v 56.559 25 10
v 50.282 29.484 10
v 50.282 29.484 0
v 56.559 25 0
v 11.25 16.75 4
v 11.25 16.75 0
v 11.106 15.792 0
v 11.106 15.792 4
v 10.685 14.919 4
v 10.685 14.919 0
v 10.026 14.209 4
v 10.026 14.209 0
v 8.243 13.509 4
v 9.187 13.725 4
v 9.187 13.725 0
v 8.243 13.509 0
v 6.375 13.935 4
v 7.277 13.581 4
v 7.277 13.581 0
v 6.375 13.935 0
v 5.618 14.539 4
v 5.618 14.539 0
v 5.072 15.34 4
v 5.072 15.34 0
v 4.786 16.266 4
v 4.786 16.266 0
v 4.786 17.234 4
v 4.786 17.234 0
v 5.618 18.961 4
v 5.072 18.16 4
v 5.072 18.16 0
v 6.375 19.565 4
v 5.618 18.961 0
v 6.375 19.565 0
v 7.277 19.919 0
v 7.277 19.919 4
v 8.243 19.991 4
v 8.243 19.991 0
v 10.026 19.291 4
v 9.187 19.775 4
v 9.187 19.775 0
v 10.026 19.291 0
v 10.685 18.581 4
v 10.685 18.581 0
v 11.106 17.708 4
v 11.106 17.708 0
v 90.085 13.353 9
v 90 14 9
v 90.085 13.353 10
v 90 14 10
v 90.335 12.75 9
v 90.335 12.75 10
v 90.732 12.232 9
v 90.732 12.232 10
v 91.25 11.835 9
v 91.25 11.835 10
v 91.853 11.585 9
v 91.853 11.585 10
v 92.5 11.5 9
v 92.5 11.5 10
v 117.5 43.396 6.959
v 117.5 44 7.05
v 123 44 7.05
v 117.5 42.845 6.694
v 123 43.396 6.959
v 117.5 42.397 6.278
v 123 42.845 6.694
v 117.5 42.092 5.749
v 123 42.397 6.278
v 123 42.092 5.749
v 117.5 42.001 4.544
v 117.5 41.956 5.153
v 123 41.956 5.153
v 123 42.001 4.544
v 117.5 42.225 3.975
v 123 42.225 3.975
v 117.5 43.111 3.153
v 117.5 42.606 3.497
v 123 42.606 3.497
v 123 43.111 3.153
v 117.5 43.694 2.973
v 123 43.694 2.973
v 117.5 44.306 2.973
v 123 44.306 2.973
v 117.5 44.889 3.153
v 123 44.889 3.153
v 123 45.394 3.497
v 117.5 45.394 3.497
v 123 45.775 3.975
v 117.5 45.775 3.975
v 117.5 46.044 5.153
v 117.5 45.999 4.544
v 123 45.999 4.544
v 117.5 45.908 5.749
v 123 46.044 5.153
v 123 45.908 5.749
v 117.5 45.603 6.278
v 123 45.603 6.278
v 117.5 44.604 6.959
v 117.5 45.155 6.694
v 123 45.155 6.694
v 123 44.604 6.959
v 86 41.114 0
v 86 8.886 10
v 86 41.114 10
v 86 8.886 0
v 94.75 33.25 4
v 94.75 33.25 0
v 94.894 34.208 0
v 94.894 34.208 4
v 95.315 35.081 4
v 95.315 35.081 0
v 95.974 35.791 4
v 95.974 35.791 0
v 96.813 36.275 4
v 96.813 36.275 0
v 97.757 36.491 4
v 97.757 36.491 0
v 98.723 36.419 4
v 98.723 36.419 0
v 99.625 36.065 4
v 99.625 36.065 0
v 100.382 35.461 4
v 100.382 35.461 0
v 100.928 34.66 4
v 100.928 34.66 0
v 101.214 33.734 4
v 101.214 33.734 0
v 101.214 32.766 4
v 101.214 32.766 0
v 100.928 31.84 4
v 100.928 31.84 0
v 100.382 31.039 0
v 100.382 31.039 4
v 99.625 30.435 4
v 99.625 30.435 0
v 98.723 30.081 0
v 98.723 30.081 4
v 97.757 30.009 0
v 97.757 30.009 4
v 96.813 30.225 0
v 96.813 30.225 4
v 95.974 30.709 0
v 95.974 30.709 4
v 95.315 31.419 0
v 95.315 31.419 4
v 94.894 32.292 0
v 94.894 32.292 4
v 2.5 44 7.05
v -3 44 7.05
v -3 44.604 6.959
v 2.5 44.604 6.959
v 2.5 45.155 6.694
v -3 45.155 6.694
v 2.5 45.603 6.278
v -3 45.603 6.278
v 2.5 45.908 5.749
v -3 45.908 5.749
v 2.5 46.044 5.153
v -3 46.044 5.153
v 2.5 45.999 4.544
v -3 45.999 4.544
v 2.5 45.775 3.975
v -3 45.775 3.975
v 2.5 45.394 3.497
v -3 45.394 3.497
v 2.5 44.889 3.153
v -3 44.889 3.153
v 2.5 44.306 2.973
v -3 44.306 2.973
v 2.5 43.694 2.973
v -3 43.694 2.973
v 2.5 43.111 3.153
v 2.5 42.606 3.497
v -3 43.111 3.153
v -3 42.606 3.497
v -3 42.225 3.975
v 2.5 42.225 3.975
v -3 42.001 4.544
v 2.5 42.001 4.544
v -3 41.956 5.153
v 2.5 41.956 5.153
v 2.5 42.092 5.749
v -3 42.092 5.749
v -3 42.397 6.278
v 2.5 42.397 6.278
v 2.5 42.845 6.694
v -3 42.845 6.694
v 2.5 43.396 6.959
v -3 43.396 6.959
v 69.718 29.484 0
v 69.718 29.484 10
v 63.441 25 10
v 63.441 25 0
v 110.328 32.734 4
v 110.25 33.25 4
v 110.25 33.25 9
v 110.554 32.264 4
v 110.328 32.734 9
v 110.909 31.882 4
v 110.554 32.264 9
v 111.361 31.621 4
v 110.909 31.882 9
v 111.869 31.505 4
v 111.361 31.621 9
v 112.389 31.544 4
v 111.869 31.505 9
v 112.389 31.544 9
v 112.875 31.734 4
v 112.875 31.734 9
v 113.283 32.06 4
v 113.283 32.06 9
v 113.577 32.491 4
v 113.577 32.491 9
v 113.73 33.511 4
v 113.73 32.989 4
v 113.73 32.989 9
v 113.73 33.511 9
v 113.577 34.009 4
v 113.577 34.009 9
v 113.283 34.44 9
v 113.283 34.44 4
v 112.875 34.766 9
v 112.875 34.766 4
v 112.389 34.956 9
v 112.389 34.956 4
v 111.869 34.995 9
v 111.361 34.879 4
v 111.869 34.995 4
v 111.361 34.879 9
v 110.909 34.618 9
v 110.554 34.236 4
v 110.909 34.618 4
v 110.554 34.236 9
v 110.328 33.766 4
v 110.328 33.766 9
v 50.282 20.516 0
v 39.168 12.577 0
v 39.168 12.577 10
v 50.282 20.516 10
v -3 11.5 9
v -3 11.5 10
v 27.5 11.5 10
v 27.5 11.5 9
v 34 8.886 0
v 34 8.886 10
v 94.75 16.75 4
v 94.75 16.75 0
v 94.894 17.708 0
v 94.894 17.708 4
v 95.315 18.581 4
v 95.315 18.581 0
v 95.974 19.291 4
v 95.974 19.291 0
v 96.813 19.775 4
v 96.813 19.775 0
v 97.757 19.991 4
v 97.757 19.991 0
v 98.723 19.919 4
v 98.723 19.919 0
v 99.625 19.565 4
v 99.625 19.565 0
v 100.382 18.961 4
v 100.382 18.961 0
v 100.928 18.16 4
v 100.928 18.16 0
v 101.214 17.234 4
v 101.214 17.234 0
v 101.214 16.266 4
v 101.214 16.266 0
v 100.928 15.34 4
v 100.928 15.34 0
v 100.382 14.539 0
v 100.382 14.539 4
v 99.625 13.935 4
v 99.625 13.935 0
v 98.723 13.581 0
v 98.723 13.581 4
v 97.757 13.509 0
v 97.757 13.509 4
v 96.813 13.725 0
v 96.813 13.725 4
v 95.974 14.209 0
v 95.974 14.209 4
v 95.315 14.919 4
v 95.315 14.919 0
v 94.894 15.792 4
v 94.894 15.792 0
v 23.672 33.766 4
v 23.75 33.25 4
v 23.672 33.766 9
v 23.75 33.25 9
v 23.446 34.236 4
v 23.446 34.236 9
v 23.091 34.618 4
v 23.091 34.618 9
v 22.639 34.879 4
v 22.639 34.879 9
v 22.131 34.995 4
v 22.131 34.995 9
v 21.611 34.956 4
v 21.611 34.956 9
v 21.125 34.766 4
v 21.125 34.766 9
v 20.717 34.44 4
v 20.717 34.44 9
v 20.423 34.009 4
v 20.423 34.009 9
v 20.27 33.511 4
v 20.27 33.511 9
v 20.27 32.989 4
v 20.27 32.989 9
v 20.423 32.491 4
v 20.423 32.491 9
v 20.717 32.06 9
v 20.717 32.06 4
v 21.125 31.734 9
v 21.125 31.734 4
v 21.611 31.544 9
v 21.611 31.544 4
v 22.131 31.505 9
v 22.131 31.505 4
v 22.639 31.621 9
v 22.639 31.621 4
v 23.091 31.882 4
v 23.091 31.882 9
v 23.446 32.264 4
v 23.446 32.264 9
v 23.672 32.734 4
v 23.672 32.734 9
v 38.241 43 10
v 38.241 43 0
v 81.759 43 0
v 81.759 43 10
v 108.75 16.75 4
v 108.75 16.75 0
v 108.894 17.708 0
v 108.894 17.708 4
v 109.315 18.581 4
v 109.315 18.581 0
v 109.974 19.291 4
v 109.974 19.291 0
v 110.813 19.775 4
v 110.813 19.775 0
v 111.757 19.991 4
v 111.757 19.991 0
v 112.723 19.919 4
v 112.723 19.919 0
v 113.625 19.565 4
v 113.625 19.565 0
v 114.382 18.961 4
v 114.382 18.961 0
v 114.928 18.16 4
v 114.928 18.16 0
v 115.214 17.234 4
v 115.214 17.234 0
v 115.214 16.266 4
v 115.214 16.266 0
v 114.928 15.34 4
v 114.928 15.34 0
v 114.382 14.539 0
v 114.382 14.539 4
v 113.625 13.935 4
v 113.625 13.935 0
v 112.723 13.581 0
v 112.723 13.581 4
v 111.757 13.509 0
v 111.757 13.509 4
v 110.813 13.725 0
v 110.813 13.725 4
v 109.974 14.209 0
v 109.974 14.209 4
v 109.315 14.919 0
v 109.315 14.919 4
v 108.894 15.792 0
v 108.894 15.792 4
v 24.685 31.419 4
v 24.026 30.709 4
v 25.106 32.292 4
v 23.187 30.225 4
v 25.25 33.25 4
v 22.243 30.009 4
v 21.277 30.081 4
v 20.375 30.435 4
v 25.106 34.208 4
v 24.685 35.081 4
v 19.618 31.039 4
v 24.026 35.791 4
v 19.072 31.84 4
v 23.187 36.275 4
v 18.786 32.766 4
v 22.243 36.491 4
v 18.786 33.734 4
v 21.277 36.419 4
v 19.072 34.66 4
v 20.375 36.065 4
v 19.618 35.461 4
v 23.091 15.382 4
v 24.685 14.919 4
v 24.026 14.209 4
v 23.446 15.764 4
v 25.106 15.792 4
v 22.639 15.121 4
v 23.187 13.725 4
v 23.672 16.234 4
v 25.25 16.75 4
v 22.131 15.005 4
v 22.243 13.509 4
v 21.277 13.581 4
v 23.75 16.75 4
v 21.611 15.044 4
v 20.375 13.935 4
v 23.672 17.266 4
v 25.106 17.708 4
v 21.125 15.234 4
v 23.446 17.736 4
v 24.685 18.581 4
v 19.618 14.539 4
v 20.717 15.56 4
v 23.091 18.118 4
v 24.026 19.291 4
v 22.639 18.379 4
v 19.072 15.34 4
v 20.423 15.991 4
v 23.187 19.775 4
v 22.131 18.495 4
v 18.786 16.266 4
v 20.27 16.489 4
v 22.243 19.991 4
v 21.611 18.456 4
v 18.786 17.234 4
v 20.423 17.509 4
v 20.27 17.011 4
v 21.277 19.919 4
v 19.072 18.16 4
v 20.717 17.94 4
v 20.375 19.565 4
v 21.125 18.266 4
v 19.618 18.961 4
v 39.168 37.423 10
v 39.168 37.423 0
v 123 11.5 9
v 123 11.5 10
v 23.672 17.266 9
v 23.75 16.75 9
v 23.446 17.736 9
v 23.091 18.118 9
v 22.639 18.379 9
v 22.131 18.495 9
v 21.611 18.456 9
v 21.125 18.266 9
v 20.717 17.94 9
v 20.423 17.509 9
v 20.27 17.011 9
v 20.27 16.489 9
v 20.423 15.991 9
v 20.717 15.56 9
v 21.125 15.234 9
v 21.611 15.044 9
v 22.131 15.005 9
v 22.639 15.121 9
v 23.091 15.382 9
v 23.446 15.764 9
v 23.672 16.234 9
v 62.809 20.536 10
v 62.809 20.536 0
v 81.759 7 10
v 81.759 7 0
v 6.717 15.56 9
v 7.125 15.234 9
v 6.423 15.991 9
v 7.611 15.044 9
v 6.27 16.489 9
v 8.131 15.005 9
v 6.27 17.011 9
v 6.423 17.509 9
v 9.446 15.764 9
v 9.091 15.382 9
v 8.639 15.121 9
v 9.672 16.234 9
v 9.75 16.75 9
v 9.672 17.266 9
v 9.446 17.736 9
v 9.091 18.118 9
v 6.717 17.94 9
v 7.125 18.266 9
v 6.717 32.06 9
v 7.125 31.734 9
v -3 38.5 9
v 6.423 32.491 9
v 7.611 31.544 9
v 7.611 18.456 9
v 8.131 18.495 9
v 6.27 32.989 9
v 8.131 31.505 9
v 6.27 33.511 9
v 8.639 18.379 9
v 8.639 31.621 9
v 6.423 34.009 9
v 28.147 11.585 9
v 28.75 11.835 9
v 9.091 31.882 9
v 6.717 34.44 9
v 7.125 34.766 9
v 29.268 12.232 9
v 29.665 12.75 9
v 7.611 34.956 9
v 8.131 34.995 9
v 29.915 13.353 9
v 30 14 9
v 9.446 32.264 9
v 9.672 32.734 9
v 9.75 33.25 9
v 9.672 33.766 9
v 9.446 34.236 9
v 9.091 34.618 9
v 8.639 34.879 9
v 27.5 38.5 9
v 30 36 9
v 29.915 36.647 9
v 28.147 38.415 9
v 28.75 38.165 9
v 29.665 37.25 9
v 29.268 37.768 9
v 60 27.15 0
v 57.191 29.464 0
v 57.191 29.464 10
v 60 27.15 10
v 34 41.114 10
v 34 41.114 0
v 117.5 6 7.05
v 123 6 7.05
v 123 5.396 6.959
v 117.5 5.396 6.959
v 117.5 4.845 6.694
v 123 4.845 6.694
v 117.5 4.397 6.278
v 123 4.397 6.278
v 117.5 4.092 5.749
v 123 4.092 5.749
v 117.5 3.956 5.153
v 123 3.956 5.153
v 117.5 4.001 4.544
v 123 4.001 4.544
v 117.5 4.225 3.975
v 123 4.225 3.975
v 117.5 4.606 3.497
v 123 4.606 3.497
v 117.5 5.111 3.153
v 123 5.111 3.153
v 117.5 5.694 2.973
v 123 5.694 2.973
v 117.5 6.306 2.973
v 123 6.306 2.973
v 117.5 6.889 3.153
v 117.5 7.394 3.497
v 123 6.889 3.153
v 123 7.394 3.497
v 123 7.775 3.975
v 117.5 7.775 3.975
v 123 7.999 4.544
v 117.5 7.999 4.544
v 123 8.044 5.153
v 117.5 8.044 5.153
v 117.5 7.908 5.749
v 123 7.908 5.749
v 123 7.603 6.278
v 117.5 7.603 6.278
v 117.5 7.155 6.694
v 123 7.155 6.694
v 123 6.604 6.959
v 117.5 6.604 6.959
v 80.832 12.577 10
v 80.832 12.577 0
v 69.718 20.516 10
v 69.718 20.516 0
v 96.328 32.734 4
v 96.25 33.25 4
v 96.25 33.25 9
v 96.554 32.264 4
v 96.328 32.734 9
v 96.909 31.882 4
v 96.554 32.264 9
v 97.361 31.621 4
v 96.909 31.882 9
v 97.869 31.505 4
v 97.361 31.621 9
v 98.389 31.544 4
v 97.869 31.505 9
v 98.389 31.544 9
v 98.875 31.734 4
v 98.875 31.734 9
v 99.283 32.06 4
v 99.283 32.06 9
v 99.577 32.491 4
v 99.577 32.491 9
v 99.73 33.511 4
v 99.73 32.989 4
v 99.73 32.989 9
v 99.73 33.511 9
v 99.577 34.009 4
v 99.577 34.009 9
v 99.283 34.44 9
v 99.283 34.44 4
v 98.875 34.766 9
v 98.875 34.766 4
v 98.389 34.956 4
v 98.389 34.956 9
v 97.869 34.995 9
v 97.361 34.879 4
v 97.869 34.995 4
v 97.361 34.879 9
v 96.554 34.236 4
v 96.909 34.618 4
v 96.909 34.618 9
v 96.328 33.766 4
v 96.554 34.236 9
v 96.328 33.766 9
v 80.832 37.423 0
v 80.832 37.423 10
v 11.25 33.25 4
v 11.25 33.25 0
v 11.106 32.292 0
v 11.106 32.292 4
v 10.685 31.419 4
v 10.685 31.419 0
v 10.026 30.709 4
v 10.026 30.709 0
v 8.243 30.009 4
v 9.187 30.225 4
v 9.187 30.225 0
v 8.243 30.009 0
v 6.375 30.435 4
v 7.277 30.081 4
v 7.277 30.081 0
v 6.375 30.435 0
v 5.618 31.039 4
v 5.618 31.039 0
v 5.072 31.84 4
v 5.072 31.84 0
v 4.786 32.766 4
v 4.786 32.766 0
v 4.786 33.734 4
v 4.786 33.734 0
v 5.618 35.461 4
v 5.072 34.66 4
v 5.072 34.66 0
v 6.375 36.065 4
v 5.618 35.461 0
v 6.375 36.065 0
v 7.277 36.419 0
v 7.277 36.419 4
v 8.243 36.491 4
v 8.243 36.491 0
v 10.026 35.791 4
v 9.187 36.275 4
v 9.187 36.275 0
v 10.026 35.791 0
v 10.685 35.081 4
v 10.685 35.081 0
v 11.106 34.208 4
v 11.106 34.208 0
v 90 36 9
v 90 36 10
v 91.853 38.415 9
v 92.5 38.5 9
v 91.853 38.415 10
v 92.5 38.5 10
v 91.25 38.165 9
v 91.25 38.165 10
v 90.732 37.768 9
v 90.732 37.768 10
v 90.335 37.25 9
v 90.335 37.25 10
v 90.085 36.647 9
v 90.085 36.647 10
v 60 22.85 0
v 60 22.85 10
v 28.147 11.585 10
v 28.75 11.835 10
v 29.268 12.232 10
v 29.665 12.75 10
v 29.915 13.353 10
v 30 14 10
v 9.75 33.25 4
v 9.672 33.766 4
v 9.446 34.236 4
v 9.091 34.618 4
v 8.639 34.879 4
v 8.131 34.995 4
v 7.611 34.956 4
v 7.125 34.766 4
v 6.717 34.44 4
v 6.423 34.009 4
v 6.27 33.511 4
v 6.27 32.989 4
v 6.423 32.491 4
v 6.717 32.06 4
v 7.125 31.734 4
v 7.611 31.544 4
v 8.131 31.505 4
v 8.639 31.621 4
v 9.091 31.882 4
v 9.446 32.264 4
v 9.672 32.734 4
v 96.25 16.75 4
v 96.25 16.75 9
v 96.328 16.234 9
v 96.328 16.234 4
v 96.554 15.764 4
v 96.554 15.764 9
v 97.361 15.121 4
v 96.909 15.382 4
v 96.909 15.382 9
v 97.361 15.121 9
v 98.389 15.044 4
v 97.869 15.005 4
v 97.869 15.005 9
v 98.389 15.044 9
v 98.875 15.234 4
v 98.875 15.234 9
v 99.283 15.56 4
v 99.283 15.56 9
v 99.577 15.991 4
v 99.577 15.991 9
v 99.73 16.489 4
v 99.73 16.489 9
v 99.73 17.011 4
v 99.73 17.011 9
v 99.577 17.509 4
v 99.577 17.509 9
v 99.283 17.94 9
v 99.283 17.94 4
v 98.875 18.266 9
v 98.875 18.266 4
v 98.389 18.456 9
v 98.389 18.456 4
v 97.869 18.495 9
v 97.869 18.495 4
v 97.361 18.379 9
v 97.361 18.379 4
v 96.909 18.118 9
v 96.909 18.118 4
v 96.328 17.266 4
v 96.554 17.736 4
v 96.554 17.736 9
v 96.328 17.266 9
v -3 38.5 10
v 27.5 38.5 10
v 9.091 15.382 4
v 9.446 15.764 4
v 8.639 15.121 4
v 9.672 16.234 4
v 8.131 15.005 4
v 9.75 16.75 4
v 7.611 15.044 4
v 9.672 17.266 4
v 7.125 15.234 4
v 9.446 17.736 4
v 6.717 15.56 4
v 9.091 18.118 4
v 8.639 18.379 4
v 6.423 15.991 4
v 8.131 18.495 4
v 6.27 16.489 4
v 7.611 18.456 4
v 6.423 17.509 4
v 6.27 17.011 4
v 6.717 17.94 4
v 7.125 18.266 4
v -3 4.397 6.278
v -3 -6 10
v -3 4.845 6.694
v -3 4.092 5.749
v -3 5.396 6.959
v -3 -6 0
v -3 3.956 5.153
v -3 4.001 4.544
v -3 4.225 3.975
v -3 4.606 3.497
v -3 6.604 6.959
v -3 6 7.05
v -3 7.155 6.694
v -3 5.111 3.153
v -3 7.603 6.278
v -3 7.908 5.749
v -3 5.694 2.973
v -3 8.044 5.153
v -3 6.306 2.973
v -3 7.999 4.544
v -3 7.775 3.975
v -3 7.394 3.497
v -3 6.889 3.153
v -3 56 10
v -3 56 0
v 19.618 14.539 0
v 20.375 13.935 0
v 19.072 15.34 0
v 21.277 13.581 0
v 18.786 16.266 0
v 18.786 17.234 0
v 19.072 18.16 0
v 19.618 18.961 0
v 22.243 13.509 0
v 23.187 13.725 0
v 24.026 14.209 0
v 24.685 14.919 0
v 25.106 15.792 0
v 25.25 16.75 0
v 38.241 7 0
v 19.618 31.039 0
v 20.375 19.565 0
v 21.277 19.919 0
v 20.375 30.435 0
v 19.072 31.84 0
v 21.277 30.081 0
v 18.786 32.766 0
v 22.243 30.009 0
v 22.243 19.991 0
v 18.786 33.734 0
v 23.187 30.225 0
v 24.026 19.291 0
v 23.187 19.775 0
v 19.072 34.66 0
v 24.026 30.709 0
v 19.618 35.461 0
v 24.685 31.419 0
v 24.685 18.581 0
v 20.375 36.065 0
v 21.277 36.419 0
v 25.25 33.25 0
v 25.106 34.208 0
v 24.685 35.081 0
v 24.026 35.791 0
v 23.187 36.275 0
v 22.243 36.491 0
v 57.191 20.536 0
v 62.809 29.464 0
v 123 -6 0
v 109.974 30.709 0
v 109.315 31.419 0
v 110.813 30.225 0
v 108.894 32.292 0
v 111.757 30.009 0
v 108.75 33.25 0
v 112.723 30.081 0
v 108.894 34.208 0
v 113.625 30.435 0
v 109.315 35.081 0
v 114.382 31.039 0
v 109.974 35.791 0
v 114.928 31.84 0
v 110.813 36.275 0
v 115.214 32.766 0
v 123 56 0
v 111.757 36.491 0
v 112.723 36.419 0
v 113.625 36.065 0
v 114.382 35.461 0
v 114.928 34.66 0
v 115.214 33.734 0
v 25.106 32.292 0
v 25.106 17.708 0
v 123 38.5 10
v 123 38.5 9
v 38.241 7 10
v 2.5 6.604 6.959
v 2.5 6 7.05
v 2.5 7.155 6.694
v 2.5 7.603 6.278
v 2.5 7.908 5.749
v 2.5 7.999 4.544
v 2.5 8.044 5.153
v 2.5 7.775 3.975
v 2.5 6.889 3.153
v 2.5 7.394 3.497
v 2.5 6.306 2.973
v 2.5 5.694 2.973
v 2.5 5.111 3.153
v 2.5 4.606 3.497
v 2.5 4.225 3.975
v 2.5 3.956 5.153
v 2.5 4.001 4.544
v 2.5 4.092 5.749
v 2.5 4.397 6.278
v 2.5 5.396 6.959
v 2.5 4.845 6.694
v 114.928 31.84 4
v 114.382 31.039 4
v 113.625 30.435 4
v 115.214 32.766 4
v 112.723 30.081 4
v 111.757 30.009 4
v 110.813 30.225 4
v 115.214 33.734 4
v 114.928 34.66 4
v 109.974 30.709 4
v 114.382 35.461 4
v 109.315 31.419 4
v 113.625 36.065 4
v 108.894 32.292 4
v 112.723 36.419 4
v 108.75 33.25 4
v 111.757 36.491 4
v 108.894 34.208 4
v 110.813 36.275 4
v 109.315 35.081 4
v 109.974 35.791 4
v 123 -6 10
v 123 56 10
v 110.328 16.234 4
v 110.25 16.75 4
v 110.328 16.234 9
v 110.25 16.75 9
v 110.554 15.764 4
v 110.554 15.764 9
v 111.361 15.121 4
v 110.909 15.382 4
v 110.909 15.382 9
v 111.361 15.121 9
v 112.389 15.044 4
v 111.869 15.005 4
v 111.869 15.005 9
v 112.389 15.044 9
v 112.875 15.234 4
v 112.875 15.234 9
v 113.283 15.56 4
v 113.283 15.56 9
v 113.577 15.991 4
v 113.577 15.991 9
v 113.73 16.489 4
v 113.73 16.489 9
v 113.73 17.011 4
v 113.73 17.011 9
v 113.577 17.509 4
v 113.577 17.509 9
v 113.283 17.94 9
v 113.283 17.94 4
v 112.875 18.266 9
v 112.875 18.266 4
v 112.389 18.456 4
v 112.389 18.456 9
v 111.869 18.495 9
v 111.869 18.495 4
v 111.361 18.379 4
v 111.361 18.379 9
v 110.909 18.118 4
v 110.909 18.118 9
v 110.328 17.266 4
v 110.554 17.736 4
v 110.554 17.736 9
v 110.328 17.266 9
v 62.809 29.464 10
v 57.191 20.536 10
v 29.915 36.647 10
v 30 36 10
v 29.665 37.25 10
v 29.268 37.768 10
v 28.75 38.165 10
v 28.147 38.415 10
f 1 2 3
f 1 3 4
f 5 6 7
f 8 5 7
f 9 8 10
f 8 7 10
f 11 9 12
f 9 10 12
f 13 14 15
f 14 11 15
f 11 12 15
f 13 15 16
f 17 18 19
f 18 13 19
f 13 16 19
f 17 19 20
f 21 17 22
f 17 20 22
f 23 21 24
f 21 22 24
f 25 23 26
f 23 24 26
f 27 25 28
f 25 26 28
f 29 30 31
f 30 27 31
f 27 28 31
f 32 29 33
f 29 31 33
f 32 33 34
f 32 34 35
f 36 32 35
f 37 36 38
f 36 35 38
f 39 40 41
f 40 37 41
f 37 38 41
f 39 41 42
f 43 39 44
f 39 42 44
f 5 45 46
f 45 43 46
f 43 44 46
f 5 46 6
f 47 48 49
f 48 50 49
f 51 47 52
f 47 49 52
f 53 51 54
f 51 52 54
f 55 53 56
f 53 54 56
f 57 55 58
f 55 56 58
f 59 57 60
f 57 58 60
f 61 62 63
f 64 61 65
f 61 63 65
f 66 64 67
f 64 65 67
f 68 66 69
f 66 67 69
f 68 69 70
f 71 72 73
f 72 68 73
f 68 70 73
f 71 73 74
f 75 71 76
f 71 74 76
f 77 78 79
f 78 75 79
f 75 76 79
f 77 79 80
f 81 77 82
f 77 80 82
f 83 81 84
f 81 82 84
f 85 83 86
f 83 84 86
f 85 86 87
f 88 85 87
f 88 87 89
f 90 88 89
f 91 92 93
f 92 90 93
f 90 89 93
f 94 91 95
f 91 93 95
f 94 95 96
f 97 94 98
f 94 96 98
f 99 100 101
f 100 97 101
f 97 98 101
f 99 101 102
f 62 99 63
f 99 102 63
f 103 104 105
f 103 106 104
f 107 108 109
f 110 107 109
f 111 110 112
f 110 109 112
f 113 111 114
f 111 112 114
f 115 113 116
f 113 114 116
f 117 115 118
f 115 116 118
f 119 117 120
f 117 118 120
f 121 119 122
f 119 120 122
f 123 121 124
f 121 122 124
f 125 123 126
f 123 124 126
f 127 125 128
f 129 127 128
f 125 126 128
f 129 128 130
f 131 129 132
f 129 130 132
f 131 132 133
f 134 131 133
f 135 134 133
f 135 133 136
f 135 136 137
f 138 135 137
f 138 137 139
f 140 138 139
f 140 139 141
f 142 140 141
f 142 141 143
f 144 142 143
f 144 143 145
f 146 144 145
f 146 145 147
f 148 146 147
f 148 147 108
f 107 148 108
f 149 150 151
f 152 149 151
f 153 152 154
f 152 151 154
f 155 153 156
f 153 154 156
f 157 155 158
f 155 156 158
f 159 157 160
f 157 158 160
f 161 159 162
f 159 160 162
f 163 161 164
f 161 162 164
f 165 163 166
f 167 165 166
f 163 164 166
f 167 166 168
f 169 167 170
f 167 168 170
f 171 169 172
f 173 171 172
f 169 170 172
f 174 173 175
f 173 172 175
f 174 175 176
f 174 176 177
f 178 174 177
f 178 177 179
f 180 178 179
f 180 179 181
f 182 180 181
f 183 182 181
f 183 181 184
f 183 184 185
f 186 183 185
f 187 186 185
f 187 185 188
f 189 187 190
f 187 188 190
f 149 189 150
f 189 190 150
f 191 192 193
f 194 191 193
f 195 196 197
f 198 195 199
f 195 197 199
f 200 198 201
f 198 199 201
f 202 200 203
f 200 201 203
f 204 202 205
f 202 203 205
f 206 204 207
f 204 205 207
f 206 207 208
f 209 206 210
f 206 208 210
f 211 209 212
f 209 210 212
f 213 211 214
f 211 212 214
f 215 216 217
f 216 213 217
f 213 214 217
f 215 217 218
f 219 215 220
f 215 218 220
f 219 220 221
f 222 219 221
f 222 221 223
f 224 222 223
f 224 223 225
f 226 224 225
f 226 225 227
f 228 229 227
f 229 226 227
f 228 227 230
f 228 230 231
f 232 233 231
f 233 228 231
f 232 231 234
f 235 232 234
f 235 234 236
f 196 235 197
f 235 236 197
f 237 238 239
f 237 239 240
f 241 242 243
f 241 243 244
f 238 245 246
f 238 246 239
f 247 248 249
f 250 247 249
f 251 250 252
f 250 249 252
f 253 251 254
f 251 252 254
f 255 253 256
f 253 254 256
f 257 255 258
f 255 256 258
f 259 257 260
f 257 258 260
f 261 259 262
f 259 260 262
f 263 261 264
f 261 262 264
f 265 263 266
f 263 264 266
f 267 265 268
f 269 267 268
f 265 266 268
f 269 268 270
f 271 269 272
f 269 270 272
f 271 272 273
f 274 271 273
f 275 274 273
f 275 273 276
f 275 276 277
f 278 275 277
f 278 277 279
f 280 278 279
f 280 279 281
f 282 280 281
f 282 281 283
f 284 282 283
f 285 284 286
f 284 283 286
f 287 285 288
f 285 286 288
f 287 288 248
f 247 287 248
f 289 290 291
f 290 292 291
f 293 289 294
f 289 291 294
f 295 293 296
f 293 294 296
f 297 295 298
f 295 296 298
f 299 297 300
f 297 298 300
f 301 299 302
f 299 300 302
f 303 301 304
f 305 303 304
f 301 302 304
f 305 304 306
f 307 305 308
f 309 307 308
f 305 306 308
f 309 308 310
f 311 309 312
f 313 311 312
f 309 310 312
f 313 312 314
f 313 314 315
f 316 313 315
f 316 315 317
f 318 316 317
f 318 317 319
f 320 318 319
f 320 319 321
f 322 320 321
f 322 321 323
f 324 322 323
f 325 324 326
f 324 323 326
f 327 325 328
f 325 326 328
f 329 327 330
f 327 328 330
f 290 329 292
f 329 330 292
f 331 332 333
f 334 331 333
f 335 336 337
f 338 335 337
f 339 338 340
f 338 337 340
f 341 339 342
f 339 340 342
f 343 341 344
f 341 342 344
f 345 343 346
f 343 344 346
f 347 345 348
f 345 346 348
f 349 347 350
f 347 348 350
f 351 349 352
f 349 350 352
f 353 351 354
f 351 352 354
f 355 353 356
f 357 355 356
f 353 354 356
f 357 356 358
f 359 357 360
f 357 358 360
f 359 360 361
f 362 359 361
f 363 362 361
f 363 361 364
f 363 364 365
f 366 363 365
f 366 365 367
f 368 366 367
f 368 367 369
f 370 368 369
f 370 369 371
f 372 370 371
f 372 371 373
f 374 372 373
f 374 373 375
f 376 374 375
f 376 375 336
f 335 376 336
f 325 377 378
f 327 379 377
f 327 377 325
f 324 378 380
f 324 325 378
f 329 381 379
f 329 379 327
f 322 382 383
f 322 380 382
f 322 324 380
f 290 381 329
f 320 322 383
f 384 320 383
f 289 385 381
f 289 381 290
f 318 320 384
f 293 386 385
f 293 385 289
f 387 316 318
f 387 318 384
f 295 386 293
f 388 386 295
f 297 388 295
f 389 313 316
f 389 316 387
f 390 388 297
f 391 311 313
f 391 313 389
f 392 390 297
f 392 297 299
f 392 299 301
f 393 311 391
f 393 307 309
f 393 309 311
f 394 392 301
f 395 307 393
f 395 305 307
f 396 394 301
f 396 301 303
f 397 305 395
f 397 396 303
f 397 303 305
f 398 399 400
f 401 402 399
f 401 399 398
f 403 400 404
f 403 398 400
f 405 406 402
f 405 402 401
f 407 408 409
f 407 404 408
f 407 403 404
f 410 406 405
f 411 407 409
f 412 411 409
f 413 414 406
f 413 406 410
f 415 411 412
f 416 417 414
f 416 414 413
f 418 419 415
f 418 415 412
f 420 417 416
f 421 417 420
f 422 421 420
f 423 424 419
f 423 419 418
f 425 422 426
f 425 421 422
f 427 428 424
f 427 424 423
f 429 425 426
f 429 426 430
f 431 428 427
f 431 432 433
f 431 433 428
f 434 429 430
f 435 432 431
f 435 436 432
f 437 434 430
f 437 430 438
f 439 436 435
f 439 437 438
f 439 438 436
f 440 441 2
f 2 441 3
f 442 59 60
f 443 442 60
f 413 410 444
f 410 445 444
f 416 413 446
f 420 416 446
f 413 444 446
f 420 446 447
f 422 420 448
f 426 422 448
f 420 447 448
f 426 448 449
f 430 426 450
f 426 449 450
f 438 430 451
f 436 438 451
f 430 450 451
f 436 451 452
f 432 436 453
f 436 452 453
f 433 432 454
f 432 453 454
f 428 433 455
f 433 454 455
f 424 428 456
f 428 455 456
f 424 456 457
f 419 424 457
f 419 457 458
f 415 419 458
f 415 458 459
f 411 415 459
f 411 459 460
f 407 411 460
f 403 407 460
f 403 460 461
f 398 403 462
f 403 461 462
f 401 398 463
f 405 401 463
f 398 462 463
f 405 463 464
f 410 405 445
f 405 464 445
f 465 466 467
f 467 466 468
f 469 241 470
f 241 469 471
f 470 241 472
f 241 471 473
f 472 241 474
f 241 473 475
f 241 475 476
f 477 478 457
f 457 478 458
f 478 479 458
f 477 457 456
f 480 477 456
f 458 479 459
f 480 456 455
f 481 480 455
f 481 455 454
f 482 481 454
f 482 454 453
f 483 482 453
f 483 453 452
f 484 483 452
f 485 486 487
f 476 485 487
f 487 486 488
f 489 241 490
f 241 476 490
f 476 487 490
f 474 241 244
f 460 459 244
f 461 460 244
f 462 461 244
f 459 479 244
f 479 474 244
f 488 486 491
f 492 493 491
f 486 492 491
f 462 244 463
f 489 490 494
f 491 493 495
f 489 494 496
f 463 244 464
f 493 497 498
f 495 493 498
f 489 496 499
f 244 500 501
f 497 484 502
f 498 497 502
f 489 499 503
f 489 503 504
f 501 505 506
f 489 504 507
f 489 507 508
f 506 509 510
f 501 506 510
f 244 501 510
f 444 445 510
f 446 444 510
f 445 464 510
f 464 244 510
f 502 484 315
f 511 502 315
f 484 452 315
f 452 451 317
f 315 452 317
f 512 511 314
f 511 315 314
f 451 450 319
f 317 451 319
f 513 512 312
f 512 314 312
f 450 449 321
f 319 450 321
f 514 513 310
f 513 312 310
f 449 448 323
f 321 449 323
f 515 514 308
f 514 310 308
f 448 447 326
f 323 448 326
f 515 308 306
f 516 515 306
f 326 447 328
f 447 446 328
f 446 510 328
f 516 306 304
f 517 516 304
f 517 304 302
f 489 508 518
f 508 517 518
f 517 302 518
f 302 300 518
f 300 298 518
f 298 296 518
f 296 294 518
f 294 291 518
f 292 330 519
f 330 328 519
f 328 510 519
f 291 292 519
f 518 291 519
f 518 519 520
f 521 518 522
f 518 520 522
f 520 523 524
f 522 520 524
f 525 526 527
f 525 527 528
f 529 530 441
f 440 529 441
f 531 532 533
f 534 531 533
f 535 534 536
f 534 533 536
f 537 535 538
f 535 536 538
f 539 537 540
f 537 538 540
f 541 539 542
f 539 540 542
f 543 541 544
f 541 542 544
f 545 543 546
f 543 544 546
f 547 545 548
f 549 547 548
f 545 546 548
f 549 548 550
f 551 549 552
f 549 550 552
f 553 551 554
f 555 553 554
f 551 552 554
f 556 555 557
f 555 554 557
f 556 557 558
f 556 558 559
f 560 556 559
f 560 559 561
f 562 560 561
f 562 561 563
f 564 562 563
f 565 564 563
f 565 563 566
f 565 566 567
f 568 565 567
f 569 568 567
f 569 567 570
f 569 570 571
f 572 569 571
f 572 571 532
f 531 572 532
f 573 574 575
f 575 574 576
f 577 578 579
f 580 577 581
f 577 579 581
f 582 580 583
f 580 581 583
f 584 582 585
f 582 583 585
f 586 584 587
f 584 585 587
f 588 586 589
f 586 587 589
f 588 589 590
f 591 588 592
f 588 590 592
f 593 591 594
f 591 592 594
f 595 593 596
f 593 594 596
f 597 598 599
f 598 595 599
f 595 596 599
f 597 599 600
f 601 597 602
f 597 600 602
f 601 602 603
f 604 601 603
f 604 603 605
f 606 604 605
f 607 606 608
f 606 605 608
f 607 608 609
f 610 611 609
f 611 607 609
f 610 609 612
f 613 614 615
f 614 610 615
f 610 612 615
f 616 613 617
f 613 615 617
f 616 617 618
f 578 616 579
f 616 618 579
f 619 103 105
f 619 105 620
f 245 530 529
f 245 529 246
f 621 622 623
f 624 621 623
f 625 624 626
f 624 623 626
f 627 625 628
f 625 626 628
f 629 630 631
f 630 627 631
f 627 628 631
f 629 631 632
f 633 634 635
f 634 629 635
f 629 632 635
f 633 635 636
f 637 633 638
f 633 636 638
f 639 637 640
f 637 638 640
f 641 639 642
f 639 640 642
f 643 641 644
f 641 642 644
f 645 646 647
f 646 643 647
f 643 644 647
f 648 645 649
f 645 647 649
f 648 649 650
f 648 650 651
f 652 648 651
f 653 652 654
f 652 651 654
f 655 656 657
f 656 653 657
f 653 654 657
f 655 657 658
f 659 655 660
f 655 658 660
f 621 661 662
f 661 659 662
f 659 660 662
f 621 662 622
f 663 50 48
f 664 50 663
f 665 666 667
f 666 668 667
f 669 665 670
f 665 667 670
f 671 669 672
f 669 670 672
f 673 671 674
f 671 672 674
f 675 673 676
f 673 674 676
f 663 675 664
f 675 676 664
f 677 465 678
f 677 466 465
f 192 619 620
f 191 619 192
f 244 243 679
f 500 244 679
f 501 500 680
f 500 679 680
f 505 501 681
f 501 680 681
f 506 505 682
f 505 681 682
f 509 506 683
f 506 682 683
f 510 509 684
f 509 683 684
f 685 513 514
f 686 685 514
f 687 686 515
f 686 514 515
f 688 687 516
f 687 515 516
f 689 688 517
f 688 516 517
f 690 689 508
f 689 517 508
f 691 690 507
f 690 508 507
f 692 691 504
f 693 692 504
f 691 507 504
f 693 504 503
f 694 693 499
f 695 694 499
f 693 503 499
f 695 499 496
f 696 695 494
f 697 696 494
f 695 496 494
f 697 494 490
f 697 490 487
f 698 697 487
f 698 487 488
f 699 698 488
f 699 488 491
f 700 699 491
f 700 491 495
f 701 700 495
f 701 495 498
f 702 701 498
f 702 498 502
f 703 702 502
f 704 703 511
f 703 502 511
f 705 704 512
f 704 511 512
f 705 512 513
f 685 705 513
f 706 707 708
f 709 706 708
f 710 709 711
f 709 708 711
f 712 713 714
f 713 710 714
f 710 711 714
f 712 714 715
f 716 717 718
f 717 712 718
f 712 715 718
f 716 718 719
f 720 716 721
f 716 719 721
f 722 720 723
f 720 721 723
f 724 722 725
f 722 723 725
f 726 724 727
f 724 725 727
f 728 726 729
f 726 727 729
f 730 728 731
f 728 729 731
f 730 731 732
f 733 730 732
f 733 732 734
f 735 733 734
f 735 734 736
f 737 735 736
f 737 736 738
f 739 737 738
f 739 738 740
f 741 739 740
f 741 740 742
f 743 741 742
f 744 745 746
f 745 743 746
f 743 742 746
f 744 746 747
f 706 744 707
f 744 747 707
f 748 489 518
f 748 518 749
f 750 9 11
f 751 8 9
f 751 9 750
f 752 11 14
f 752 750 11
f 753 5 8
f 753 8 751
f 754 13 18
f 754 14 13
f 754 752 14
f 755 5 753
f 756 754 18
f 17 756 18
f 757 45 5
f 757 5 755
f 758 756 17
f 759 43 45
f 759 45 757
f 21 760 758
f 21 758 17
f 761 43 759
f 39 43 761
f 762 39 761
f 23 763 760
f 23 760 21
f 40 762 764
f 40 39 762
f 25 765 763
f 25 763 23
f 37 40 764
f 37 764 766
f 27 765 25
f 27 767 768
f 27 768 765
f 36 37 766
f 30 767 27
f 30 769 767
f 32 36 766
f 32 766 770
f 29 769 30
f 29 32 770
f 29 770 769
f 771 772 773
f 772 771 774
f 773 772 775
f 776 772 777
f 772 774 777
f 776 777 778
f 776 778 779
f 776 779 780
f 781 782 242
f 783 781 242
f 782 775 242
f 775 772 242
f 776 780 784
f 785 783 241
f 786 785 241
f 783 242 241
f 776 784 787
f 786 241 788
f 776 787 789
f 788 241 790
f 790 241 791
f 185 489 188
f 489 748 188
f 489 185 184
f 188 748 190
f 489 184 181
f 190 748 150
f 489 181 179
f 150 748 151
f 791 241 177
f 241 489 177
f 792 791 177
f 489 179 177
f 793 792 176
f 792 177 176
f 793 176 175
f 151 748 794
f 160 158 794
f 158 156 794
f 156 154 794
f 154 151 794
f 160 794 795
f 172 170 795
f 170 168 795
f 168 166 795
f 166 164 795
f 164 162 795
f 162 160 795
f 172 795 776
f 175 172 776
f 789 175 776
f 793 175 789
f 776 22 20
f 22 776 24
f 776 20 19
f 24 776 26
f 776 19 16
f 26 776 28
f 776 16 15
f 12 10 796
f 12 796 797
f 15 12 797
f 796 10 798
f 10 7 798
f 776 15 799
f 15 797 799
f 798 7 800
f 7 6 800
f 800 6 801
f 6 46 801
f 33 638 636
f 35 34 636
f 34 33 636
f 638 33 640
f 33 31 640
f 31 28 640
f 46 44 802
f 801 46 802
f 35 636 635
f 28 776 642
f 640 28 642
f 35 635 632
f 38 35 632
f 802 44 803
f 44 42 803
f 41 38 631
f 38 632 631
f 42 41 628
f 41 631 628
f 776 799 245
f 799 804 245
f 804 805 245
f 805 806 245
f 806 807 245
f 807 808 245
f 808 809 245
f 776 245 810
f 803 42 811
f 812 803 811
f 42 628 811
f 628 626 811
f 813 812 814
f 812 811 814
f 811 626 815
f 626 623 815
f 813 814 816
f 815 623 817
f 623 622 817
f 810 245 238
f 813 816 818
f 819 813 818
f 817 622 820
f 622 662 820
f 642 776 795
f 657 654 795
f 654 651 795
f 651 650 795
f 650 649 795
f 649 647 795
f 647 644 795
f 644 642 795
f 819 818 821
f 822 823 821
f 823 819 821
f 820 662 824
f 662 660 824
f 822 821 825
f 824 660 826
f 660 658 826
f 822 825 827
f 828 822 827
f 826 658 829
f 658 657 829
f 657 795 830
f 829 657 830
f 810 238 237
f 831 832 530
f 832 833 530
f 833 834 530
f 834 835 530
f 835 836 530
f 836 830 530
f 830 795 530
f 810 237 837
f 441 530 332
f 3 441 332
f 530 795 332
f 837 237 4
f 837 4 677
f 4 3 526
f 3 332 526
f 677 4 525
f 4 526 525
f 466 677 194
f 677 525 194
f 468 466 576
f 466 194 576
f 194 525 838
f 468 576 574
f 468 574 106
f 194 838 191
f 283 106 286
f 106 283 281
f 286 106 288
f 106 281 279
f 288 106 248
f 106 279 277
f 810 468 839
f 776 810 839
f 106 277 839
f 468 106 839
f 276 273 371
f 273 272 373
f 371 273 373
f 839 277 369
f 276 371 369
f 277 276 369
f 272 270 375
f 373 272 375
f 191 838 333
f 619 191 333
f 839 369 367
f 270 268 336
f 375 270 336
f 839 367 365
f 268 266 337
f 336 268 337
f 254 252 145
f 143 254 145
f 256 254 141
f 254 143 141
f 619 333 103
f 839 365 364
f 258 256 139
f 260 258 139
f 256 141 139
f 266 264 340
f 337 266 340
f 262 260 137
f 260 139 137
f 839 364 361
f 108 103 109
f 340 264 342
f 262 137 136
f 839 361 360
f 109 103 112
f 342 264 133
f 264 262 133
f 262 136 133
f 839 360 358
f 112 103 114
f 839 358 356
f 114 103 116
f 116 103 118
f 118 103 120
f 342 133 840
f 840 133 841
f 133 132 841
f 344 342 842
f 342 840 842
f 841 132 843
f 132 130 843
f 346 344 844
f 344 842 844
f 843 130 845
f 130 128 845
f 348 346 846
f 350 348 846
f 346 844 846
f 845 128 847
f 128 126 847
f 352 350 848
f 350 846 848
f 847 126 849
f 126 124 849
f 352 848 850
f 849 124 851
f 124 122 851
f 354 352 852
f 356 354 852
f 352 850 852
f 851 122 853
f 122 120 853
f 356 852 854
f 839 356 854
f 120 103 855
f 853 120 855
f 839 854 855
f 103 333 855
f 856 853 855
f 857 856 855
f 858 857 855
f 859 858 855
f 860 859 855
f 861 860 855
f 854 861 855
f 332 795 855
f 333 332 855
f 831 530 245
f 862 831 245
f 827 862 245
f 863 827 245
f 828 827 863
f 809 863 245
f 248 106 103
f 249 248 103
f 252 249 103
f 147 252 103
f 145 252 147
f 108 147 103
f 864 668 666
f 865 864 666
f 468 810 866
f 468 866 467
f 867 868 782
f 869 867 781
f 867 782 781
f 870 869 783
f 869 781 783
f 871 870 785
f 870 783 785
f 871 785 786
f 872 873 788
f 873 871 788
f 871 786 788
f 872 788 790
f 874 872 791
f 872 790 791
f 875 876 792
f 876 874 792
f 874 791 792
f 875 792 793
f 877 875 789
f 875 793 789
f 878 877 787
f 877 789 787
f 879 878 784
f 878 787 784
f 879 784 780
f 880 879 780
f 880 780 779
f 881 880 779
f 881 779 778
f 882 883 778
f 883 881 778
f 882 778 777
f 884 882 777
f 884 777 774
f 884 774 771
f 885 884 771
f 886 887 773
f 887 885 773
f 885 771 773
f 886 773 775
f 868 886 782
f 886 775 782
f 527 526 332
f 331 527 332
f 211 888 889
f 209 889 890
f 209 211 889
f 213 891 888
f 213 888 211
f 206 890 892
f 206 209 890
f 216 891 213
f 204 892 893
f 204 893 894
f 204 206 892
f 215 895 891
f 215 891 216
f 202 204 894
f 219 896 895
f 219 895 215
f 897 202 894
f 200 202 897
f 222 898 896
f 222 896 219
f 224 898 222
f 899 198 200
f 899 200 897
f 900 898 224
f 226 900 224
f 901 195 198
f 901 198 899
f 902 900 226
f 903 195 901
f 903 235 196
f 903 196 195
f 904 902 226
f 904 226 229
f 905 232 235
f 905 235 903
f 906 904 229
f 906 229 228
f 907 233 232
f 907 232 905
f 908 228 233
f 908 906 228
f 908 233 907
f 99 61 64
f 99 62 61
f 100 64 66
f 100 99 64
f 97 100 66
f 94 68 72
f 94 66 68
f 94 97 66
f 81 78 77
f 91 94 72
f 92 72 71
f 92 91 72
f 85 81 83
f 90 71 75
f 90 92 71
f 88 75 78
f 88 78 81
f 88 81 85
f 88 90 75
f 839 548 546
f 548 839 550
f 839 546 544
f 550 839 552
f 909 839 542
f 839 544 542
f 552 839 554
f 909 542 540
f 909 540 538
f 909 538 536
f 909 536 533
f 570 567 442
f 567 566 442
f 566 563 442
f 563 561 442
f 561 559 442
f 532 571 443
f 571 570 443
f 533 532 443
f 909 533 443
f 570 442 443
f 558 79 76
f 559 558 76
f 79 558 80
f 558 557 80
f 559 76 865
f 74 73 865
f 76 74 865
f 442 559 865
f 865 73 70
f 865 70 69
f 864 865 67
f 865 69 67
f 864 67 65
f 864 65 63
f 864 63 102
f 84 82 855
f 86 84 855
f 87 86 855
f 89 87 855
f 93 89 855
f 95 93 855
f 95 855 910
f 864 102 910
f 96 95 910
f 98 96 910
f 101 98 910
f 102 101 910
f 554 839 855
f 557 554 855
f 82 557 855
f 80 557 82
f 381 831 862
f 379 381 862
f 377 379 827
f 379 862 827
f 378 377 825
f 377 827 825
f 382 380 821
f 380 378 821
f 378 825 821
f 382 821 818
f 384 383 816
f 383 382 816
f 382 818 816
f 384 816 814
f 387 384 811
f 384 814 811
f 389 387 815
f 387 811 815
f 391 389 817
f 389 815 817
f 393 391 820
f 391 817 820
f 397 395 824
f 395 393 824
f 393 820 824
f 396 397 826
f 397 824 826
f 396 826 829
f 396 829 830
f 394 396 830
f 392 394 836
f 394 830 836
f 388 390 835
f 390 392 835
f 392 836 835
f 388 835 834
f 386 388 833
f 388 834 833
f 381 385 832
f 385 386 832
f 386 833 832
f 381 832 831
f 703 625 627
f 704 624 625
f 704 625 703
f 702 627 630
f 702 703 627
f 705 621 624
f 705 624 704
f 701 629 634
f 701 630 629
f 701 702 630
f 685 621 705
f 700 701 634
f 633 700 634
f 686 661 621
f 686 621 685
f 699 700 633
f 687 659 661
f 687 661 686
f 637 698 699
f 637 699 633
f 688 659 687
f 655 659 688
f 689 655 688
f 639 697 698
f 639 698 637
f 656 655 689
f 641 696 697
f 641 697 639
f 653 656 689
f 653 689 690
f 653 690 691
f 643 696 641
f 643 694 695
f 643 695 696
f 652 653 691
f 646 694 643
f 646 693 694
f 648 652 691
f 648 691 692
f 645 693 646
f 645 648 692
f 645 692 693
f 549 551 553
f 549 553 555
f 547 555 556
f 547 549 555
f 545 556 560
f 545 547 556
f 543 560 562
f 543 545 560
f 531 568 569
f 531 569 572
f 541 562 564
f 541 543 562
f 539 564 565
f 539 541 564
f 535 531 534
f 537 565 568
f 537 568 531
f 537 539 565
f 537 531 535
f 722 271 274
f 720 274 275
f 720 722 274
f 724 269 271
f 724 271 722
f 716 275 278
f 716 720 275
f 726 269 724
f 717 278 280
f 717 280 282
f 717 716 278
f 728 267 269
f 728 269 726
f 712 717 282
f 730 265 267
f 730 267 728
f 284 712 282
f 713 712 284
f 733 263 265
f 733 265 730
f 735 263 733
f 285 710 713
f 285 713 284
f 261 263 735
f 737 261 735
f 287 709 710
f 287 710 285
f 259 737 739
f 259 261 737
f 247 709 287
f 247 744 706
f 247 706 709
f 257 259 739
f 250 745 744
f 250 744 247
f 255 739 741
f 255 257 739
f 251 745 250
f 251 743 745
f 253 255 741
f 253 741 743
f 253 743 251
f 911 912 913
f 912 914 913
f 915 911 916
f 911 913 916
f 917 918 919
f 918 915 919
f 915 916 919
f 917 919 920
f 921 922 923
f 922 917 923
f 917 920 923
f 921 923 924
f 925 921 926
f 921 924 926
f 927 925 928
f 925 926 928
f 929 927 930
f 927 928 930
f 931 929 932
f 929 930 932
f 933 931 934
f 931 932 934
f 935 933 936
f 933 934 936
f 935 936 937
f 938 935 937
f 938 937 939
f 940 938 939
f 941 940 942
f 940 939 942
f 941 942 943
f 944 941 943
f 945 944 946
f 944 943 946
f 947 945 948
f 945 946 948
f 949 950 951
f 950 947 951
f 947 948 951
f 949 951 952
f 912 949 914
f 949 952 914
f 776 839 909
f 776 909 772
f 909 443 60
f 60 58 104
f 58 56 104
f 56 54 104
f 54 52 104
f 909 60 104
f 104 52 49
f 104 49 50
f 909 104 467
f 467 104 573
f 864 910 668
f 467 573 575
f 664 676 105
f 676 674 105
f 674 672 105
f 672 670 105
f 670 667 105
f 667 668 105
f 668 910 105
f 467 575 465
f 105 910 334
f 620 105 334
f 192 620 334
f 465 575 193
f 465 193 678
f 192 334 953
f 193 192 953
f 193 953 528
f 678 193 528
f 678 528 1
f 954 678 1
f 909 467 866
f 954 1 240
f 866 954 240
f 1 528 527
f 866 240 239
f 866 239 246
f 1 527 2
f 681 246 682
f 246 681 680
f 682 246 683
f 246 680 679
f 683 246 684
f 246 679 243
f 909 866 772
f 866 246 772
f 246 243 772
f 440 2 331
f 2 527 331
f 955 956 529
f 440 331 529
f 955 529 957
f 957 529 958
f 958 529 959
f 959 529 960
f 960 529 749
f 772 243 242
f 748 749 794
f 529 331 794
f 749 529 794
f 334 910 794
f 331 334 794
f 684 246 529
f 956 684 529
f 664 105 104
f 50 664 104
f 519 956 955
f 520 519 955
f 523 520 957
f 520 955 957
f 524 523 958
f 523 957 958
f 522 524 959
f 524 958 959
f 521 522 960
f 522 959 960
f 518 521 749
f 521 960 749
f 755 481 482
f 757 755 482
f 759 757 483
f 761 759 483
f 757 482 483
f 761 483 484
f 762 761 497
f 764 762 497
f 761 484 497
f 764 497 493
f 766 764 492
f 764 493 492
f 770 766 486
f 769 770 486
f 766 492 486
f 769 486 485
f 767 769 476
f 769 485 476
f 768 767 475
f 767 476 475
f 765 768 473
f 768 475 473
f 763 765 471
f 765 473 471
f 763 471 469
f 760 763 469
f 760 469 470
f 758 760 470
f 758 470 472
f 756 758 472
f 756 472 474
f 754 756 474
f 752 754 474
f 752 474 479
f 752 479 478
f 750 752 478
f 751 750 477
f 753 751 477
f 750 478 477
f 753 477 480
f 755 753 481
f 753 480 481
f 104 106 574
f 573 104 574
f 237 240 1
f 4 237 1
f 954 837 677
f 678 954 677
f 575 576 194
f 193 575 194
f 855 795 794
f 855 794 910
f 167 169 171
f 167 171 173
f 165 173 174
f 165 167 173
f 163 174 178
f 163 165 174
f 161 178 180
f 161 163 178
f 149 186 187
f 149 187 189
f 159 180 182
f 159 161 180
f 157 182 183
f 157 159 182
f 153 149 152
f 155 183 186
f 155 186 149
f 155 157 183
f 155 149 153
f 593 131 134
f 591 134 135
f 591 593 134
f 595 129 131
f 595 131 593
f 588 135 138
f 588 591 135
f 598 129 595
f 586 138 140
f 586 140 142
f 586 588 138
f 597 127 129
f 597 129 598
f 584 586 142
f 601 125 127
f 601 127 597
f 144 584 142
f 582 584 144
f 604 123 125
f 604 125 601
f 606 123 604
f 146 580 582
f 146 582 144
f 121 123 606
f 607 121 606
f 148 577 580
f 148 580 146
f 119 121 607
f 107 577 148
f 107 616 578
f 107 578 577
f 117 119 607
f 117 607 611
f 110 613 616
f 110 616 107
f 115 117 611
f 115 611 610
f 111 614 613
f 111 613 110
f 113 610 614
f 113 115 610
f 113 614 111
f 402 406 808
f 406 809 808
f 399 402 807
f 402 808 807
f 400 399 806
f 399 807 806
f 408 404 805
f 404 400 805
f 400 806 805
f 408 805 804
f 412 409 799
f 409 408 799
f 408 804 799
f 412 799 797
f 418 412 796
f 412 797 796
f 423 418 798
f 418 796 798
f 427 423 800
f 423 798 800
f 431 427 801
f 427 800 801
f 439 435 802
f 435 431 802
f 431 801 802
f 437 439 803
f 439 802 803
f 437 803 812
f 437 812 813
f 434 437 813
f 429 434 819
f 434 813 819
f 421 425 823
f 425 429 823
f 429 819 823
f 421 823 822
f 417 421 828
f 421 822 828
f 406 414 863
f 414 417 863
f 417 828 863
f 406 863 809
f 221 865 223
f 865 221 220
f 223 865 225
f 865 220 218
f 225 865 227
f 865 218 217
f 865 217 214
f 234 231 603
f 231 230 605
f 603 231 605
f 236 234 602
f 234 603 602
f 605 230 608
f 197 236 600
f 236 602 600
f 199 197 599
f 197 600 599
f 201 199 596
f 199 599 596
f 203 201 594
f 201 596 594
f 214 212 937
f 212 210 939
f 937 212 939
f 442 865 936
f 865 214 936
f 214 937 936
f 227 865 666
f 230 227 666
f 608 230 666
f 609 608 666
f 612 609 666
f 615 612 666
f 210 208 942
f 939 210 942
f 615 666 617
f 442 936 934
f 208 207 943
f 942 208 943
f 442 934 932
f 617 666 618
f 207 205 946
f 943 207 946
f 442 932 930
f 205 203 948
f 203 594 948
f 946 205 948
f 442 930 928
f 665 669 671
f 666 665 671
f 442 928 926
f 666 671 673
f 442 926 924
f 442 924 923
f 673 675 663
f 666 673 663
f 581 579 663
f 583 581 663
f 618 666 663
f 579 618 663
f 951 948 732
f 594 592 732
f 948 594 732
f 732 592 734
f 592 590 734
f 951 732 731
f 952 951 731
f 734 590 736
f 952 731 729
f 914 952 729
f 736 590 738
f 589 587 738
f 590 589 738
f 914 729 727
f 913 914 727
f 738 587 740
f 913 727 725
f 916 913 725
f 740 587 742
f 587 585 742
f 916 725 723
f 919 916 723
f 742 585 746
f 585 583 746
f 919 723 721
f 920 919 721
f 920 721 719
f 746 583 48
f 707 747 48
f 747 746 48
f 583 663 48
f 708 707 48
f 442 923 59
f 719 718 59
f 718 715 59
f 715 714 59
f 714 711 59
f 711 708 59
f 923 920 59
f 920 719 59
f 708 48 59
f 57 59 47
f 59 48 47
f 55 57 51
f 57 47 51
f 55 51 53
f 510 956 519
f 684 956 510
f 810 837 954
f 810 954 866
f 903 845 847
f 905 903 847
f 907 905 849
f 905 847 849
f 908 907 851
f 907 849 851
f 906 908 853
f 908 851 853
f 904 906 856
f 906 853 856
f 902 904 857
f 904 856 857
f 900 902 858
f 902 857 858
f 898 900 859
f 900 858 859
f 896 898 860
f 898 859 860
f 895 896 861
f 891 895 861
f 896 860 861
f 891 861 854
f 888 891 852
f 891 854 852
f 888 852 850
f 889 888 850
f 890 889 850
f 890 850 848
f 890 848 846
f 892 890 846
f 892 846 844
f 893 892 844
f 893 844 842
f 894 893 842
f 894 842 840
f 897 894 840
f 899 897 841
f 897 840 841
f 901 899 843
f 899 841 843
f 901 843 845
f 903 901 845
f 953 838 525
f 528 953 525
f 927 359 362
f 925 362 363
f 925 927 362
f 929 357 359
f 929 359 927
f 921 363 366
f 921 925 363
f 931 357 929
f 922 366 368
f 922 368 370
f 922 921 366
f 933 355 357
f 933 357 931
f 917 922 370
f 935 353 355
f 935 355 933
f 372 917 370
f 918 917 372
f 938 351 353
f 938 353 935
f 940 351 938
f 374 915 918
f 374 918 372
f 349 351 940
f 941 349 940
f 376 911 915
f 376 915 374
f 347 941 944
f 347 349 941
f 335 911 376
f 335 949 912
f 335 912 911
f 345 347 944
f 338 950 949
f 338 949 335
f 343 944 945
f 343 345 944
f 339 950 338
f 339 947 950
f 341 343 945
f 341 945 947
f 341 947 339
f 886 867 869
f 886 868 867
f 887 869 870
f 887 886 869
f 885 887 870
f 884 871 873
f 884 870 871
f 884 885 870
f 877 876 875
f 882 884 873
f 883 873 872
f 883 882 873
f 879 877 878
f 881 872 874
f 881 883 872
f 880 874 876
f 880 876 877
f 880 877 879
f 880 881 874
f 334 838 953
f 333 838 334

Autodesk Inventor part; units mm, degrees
ref_plane "YZ Plane" through (0, 0, 0) normal (1, 0, 0) x (0, 1, 0)
ref_plane "XZ Plane" through (0, 0, 0) normal (0, 1, 0) x (-1, 0, 0)
ref_plane "XY Plane" through (0, 0, 0) normal (0, 0, 1) x (1, 0, 0)
sketch "Sketch1" plane through (0, 0, 0) normal (0, 0, 1) x (1, 0, 0)
  line L0 (0, 0) -> (120, 0)
  line L1 (120, 0) -> (120, 50)
  line L2 (120, 50) -> (0, 50)
  line L3 (0, 50) -> (0, 0)
  dimension "d0" = 120
  dimension "d1" = 50
extrude "Extrusion1" add sketch "Sketch1" along normal blind 10
sketch "Sketch2" plane through (0, 0, 10) normal (0, 0, 1) x (1, 0, 0)
  line L0 (0, 50) -> (0, 0) projected
  line L1 (0, 11.5) -> (0, 38.5)
  line L2 (0, 38.5) -> (27.5, 38.5)
  line L3 (30, 36) -> (30, 14)
  line L4 (27.5, 11.5) -> (0, 11.5)
  line L5 (0, 11.5) -> (0, 38.5)
  arc A0 (30, 36) -> (27.5, 38.5) centre (27.5, 36) ccw
  arc A1 (27.5, 11.5) -> (30, 14) centre (27.5, 14) ccw
  point P0 (0, 25)
  point P1 (30, 11.5)
  point P2 (30, 38.5)
  dimension "d4" = 27
  dimension "d5" = 30
  dimension "d8" = 2.5
  dimension "d9" = 2.5
extrude "Extrusion2" cut sketch "Sketch2" against normal blind 1
sketch "Sketch3" plane through (0, 0, 9) normal (0, 0, 1) x (1, 0, 0)
  arc A0 (30, 36) -> (27.5, 38.5) centre (27.5, 36) ccw projected
  line L0 (0, 38.5) -> (27.5, 38.5) projected
  line L1 (0, 38.5) -> (27.5, 38.5) projected
  line L2 (0, 11.5) -> (0, 38.5) projected
  line L3 (27.5, 11.5) -> (0, 11.5) projected
  arc A1 (27.5, 11.5) -> (30, 14) centre (27.5, 14) ccw projected
  line L4 (30, 36) -> (30, 14) projected
  arc A2 (30, 36) -> (27.5, 38.5) centre (27.5, 36) ccw projected
  line L5 (30, 36) -> (30, 14) projected
  line L6 (30, 38.5) -> (22, 38.5)
  line L7 (22, 38.5) -> (22, 33.25)
  line L8 (22, 33.25) -> (30, 33.25)
  line L9 (30, 33.25) -> (30, 38.5)
  circle A3 centre (22, 33.25) radius 1.75
  line L10 (30, 38.5) -> (8, 38.5)
  line L11 (8, 38.5) -> (8, 33.25)
  line L12 (8, 33.25) -> (30, 33.25)
  line L13 (30, 33.25) -> (30, 38.5)
  circle A4 centre (8, 33.25) radius 1.75
  line L14 (30, 25) -> (16.651, 25)
  circle A5 centre (22, 16.75) radius 1.75
  circle A6 centre (8, 16.75) radius 1.75
  point P0 (0, 0)
  dimension "d10" = 8
  dimension "d11" = 5.25
  dimension "d12" = 3.5
  dimension "d13" = 22
  dimension "d14" = 3.5
extrude "Extrusion3" cut sketch "Sketch3" against normal up to surface (9 mm away) contours A3 L12 L8 | L8 L7 A3 | L7 L12 A3 | A4 L12 L11 | L11 L12 A4 | A5 | A6
ref_plane "Work Plane1" through (60, 0, 0) normal (-1, 0, 0) x (0, 0, 1)
mirror "Mirror1" about plane through (60, 0, 0) normal (-1, 0, 0) of "Extrusion2", "Extrusion3"
ref_plane "Work Plane2" through (0, 25, 0) normal (0, -1, 0) x (1, 0, 0)
sketch "Sketch6" plane through (0, 0, 0) normal (-1, 0, 0) x (0, 0, 1)
  line L0 (9, 38.5) -> (10, 38.5) projected
  line L1 (9, 11.5) -> (9, 38.5) projected
  line L2 (10, 11.5) -> (9, 11.5) projected
  line L3 (0, 50) -> (0, 0) projected
  line L4 (0, 0) -> (10, 0) projected
  line L5 (10, 11.5) -> (10, 0) projected
  line L6 (0, 50) -> (10, 50) projected
  line L7 (10, 50) -> (10, 38.5) projected
extrude "Extrusion6" add sketch "Sketch6" along normal blind 3
mirror "Mirror4" about plane through (60, 0, 0) normal (-1, 0, 0) of "Extrusion6"
sketch "Sketch7" plane through (0, 0, 0) normal (0, 0, -1) x (-1, 0, 0)
  circle A0 centre (-112, 16.75) radius 1.75 projected
  circle A1 centre (-112, 16.75) radius 3.25
  point P0 (0, 0)
  dimension "d27" = 6.5
extrude "Extrusion7" cut sketch "Sketch7" against normal blind 4
pattern_linear "Rectangular Pattern1" count 2 spacing -14 along (1, 0, 0) count 2 spacing 16.5 along (0, 1, 0) of "Extrusion7"
mirror "Mirror5" about plane through (60, 0, 0) normal (-1, 0, 0) of "Extrusion7", "Rectangular Pattern1"
sketch "Sketch9" plane through (-3, 0, 0) normal (-1, 0, 0) x (0, 0, 1)
  line L0 (10, 50) -> (5, 50)
  line L1 (5, 50) -> (5, 44)
  line L2 (5, 44) -> (10, 44)
  line L3 (10, 44) -> (10, 50)
  circle A0 centre (5, 44) radius 2.05
  point P0 (0, 0)
  dimension "d36" = 5
  dimension "d37" = 6
  dimension "d38" = 4.1
extrude "Extrusion8" cut sketch "Sketch9" against normal blind 5.5 contours A0 L2 L1 | L1 L2 A0
mirror "Mirror6" about plane through (0, 25, 0) normal (0, -1, 0) of "Extrusion8"
sketch "Sketch12" plane through (0, 0, 0) normal (0, 0, -1) x (-1, 0, 0)
  line L0 (-123, 0) -> (3, 0) projected
  line L1 (-60, 0) -> (-60, 50)
  line L2 (3, 50) -> (-123, 50) projected
  line L3 (-88, 5) -> (-88, 45)
  line L4 (-88, 45) -> (-32, 45)
  line L5 (-32, 45) -> (-32, 5)
  line L6 (-32, 5) -> (-88, 5)
  line L7 (-88, 5) -> (-32, 45) construction
  line L8 (-88, 45) -> (-32, 5) construction
  line L9 (-60, 45) -> (-60, 43)
  line L10 (-63.9713, 27.8366) -> (-62.8088, 29.4641)
  line L11 (-62.8088, 29.4641) -> (-85.7421, 45.845)
  line L12 (-63.8051, 43) -> (-81.7591, 43)
  line L13 (-60, 43) -> (-60, 27.1502)
  line L14 (-62.8088, 29.4641) -> (-60, 27.1502)
  line L15 (-88, 25) -> (-86, 25)
  line L16 (-86, 25) -> (-86, 27)
  line L17 (-79.67, 39.05) -> (-80.8325, 37.4226)
  line L18 (-80.8325, 37.4226) -> (-69.7179, 29.4835)
  line L19 (-86, 41.1136) -> (-86, 27)
  line L20 (-86, 41.1136) -> (-80.8325, 37.4226)
  line L21 (-69.7179, 29.4835) -> (-63.4409, 25)
  line L22 (-63.4409, 25) -> (-86, 25)
  line L23 (-63.8051, 43) -> (-60, 43)
  line L24 (-57.1912, 29.4641) -> (-34.2579, 45.845)
  line L25 (-56.1949, 43) -> (-38.2409, 43)
  line L26 (-57.1912, 29.4641) -> (-60, 27.1502)
  line L27 (-34, 25) -> (-34, 27)
  line L28 (-39.1675, 37.4226) -> (-50.2821, 29.4835)
  line L29 (-34, 41.1136) -> (-34, 27)
  line L30 (-34, 41.1136) -> (-39.1675, 37.4226)
  line L31 (-50.2821, 29.4835) -> (-56.5591, 25)
  line L32 (-56.5591, 25) -> (-34, 25)
  line L33 (-56.1949, 43) -> (-60, 43)
  line L34 (-88, 5) -> (-32, 45) construction
  line L35 (-62.8088, 20.5359) -> (-85.7421, 4.155)
  line L36 (-63.8051, 7) -> (-81.7591, 7)
  line L37 (-62.8088, 20.5359) -> (-60, 22.8498)
  line L38 (-86, 25) -> (-86, 23)
  line L39 (-80.8325, 12.5774) -> (-69.7179, 20.5165)
  line L40 (-86, 8.8864) -> (-86, 23)
  line L41 (-86, 8.8864) -> (-80.8325, 12.5774)
  line L42 (-69.7179, 20.5165) -> (-63.4409, 25)
  line L43 (-34, 25) -> (-34, 23)
  line L44 (-34, 8.8864) -> (-34, 23)
  line L45 (-34, 8.8864) -> (-39.1675, 12.5774)
  line L46 (-39.1675, 12.5774) -> (-50.2821, 20.5165)
  line L47 (-50.2821, 20.5165) -> (-56.5591, 25)
  line L48 (-57.1912, 20.5359) -> (-34.2579, 4.155)
  line L49 (-56.1949, 7) -> (-38.2409, 7)
  line L50 (-56.1949, 7) -> (-60, 7)
  line L51 (-57.1912, 20.5359) -> (-60, 22.8498)
  line L52 (-60, 7) -> (-63.8051, 7)
  point P0 (0, 0)
  point P1 (-60, 25)
  dimension "d41" = 40
  dimension "d42" = 56
  dimension "d43" = 2
  dimension "d45" = 2
  dimension "d46" = 2
  dimension "d47" = 2
  dimension "d48" = 2
extrude "Extrusion9" cut sketch "Sketch12" against normal up to surface (10 mm away) contours L52 L36 L35 L37 L1 | L1 L51 L48 L49 L50 | L16 L19 L20 L18 L21 L22 | L22 L42 L39 L41 L40 L38 | L14 L11 L12 L23 L1 | L1 L33 L25 L24 L26 | L32 L31 L28 L30 L29 L27 | L43 L44 L45 L46 L47 L32
sketch "Sketch13" plane through (-3, 50, 10) normal (0, 1, 0) x (1, 0, 0)
  line L0 (126, 0) -> (126, 10) projected
  line L1 (0, 10) -> (126, 10) projected
  line L2 (0, 0) -> (126, 0) projected
  line L3 (0, 0) -> (0, 10) projected
  point P0 (3, 10)
extrude "Extrusion10" add sketch "Sketch13" along normal blind 5
mirror "Mirror7" about plane through (0, 25, 0) normal (0, -1, 0) of "Extrusion10"
mirror "Mirror8" about plane through (60, 0, 0) normal (-1, 0, 0) of "Extrusion8", "Mirror6"
sketch "Sketch14" plane through (-3, 55, 10) normal (0, 1, 0) x (1, 0, 0)
  line L0 (0, 0) -> (126, 0) projected
  line L1 (0, 0) -> (126, 0)
  line L2 (126, 0) -> (126, 10)
  line L3 (126, 10) -> (0, 10)
  line L4 (0, 10) -> (0, 0)
  point P0 (3, 10)
extrude "Extrusion11" add sketch "Sketch14" along normal blind 1
mirror "Mirror9" about plane through (0, 25, 0) normal (0, -1, 0) of "Extrusion11"
